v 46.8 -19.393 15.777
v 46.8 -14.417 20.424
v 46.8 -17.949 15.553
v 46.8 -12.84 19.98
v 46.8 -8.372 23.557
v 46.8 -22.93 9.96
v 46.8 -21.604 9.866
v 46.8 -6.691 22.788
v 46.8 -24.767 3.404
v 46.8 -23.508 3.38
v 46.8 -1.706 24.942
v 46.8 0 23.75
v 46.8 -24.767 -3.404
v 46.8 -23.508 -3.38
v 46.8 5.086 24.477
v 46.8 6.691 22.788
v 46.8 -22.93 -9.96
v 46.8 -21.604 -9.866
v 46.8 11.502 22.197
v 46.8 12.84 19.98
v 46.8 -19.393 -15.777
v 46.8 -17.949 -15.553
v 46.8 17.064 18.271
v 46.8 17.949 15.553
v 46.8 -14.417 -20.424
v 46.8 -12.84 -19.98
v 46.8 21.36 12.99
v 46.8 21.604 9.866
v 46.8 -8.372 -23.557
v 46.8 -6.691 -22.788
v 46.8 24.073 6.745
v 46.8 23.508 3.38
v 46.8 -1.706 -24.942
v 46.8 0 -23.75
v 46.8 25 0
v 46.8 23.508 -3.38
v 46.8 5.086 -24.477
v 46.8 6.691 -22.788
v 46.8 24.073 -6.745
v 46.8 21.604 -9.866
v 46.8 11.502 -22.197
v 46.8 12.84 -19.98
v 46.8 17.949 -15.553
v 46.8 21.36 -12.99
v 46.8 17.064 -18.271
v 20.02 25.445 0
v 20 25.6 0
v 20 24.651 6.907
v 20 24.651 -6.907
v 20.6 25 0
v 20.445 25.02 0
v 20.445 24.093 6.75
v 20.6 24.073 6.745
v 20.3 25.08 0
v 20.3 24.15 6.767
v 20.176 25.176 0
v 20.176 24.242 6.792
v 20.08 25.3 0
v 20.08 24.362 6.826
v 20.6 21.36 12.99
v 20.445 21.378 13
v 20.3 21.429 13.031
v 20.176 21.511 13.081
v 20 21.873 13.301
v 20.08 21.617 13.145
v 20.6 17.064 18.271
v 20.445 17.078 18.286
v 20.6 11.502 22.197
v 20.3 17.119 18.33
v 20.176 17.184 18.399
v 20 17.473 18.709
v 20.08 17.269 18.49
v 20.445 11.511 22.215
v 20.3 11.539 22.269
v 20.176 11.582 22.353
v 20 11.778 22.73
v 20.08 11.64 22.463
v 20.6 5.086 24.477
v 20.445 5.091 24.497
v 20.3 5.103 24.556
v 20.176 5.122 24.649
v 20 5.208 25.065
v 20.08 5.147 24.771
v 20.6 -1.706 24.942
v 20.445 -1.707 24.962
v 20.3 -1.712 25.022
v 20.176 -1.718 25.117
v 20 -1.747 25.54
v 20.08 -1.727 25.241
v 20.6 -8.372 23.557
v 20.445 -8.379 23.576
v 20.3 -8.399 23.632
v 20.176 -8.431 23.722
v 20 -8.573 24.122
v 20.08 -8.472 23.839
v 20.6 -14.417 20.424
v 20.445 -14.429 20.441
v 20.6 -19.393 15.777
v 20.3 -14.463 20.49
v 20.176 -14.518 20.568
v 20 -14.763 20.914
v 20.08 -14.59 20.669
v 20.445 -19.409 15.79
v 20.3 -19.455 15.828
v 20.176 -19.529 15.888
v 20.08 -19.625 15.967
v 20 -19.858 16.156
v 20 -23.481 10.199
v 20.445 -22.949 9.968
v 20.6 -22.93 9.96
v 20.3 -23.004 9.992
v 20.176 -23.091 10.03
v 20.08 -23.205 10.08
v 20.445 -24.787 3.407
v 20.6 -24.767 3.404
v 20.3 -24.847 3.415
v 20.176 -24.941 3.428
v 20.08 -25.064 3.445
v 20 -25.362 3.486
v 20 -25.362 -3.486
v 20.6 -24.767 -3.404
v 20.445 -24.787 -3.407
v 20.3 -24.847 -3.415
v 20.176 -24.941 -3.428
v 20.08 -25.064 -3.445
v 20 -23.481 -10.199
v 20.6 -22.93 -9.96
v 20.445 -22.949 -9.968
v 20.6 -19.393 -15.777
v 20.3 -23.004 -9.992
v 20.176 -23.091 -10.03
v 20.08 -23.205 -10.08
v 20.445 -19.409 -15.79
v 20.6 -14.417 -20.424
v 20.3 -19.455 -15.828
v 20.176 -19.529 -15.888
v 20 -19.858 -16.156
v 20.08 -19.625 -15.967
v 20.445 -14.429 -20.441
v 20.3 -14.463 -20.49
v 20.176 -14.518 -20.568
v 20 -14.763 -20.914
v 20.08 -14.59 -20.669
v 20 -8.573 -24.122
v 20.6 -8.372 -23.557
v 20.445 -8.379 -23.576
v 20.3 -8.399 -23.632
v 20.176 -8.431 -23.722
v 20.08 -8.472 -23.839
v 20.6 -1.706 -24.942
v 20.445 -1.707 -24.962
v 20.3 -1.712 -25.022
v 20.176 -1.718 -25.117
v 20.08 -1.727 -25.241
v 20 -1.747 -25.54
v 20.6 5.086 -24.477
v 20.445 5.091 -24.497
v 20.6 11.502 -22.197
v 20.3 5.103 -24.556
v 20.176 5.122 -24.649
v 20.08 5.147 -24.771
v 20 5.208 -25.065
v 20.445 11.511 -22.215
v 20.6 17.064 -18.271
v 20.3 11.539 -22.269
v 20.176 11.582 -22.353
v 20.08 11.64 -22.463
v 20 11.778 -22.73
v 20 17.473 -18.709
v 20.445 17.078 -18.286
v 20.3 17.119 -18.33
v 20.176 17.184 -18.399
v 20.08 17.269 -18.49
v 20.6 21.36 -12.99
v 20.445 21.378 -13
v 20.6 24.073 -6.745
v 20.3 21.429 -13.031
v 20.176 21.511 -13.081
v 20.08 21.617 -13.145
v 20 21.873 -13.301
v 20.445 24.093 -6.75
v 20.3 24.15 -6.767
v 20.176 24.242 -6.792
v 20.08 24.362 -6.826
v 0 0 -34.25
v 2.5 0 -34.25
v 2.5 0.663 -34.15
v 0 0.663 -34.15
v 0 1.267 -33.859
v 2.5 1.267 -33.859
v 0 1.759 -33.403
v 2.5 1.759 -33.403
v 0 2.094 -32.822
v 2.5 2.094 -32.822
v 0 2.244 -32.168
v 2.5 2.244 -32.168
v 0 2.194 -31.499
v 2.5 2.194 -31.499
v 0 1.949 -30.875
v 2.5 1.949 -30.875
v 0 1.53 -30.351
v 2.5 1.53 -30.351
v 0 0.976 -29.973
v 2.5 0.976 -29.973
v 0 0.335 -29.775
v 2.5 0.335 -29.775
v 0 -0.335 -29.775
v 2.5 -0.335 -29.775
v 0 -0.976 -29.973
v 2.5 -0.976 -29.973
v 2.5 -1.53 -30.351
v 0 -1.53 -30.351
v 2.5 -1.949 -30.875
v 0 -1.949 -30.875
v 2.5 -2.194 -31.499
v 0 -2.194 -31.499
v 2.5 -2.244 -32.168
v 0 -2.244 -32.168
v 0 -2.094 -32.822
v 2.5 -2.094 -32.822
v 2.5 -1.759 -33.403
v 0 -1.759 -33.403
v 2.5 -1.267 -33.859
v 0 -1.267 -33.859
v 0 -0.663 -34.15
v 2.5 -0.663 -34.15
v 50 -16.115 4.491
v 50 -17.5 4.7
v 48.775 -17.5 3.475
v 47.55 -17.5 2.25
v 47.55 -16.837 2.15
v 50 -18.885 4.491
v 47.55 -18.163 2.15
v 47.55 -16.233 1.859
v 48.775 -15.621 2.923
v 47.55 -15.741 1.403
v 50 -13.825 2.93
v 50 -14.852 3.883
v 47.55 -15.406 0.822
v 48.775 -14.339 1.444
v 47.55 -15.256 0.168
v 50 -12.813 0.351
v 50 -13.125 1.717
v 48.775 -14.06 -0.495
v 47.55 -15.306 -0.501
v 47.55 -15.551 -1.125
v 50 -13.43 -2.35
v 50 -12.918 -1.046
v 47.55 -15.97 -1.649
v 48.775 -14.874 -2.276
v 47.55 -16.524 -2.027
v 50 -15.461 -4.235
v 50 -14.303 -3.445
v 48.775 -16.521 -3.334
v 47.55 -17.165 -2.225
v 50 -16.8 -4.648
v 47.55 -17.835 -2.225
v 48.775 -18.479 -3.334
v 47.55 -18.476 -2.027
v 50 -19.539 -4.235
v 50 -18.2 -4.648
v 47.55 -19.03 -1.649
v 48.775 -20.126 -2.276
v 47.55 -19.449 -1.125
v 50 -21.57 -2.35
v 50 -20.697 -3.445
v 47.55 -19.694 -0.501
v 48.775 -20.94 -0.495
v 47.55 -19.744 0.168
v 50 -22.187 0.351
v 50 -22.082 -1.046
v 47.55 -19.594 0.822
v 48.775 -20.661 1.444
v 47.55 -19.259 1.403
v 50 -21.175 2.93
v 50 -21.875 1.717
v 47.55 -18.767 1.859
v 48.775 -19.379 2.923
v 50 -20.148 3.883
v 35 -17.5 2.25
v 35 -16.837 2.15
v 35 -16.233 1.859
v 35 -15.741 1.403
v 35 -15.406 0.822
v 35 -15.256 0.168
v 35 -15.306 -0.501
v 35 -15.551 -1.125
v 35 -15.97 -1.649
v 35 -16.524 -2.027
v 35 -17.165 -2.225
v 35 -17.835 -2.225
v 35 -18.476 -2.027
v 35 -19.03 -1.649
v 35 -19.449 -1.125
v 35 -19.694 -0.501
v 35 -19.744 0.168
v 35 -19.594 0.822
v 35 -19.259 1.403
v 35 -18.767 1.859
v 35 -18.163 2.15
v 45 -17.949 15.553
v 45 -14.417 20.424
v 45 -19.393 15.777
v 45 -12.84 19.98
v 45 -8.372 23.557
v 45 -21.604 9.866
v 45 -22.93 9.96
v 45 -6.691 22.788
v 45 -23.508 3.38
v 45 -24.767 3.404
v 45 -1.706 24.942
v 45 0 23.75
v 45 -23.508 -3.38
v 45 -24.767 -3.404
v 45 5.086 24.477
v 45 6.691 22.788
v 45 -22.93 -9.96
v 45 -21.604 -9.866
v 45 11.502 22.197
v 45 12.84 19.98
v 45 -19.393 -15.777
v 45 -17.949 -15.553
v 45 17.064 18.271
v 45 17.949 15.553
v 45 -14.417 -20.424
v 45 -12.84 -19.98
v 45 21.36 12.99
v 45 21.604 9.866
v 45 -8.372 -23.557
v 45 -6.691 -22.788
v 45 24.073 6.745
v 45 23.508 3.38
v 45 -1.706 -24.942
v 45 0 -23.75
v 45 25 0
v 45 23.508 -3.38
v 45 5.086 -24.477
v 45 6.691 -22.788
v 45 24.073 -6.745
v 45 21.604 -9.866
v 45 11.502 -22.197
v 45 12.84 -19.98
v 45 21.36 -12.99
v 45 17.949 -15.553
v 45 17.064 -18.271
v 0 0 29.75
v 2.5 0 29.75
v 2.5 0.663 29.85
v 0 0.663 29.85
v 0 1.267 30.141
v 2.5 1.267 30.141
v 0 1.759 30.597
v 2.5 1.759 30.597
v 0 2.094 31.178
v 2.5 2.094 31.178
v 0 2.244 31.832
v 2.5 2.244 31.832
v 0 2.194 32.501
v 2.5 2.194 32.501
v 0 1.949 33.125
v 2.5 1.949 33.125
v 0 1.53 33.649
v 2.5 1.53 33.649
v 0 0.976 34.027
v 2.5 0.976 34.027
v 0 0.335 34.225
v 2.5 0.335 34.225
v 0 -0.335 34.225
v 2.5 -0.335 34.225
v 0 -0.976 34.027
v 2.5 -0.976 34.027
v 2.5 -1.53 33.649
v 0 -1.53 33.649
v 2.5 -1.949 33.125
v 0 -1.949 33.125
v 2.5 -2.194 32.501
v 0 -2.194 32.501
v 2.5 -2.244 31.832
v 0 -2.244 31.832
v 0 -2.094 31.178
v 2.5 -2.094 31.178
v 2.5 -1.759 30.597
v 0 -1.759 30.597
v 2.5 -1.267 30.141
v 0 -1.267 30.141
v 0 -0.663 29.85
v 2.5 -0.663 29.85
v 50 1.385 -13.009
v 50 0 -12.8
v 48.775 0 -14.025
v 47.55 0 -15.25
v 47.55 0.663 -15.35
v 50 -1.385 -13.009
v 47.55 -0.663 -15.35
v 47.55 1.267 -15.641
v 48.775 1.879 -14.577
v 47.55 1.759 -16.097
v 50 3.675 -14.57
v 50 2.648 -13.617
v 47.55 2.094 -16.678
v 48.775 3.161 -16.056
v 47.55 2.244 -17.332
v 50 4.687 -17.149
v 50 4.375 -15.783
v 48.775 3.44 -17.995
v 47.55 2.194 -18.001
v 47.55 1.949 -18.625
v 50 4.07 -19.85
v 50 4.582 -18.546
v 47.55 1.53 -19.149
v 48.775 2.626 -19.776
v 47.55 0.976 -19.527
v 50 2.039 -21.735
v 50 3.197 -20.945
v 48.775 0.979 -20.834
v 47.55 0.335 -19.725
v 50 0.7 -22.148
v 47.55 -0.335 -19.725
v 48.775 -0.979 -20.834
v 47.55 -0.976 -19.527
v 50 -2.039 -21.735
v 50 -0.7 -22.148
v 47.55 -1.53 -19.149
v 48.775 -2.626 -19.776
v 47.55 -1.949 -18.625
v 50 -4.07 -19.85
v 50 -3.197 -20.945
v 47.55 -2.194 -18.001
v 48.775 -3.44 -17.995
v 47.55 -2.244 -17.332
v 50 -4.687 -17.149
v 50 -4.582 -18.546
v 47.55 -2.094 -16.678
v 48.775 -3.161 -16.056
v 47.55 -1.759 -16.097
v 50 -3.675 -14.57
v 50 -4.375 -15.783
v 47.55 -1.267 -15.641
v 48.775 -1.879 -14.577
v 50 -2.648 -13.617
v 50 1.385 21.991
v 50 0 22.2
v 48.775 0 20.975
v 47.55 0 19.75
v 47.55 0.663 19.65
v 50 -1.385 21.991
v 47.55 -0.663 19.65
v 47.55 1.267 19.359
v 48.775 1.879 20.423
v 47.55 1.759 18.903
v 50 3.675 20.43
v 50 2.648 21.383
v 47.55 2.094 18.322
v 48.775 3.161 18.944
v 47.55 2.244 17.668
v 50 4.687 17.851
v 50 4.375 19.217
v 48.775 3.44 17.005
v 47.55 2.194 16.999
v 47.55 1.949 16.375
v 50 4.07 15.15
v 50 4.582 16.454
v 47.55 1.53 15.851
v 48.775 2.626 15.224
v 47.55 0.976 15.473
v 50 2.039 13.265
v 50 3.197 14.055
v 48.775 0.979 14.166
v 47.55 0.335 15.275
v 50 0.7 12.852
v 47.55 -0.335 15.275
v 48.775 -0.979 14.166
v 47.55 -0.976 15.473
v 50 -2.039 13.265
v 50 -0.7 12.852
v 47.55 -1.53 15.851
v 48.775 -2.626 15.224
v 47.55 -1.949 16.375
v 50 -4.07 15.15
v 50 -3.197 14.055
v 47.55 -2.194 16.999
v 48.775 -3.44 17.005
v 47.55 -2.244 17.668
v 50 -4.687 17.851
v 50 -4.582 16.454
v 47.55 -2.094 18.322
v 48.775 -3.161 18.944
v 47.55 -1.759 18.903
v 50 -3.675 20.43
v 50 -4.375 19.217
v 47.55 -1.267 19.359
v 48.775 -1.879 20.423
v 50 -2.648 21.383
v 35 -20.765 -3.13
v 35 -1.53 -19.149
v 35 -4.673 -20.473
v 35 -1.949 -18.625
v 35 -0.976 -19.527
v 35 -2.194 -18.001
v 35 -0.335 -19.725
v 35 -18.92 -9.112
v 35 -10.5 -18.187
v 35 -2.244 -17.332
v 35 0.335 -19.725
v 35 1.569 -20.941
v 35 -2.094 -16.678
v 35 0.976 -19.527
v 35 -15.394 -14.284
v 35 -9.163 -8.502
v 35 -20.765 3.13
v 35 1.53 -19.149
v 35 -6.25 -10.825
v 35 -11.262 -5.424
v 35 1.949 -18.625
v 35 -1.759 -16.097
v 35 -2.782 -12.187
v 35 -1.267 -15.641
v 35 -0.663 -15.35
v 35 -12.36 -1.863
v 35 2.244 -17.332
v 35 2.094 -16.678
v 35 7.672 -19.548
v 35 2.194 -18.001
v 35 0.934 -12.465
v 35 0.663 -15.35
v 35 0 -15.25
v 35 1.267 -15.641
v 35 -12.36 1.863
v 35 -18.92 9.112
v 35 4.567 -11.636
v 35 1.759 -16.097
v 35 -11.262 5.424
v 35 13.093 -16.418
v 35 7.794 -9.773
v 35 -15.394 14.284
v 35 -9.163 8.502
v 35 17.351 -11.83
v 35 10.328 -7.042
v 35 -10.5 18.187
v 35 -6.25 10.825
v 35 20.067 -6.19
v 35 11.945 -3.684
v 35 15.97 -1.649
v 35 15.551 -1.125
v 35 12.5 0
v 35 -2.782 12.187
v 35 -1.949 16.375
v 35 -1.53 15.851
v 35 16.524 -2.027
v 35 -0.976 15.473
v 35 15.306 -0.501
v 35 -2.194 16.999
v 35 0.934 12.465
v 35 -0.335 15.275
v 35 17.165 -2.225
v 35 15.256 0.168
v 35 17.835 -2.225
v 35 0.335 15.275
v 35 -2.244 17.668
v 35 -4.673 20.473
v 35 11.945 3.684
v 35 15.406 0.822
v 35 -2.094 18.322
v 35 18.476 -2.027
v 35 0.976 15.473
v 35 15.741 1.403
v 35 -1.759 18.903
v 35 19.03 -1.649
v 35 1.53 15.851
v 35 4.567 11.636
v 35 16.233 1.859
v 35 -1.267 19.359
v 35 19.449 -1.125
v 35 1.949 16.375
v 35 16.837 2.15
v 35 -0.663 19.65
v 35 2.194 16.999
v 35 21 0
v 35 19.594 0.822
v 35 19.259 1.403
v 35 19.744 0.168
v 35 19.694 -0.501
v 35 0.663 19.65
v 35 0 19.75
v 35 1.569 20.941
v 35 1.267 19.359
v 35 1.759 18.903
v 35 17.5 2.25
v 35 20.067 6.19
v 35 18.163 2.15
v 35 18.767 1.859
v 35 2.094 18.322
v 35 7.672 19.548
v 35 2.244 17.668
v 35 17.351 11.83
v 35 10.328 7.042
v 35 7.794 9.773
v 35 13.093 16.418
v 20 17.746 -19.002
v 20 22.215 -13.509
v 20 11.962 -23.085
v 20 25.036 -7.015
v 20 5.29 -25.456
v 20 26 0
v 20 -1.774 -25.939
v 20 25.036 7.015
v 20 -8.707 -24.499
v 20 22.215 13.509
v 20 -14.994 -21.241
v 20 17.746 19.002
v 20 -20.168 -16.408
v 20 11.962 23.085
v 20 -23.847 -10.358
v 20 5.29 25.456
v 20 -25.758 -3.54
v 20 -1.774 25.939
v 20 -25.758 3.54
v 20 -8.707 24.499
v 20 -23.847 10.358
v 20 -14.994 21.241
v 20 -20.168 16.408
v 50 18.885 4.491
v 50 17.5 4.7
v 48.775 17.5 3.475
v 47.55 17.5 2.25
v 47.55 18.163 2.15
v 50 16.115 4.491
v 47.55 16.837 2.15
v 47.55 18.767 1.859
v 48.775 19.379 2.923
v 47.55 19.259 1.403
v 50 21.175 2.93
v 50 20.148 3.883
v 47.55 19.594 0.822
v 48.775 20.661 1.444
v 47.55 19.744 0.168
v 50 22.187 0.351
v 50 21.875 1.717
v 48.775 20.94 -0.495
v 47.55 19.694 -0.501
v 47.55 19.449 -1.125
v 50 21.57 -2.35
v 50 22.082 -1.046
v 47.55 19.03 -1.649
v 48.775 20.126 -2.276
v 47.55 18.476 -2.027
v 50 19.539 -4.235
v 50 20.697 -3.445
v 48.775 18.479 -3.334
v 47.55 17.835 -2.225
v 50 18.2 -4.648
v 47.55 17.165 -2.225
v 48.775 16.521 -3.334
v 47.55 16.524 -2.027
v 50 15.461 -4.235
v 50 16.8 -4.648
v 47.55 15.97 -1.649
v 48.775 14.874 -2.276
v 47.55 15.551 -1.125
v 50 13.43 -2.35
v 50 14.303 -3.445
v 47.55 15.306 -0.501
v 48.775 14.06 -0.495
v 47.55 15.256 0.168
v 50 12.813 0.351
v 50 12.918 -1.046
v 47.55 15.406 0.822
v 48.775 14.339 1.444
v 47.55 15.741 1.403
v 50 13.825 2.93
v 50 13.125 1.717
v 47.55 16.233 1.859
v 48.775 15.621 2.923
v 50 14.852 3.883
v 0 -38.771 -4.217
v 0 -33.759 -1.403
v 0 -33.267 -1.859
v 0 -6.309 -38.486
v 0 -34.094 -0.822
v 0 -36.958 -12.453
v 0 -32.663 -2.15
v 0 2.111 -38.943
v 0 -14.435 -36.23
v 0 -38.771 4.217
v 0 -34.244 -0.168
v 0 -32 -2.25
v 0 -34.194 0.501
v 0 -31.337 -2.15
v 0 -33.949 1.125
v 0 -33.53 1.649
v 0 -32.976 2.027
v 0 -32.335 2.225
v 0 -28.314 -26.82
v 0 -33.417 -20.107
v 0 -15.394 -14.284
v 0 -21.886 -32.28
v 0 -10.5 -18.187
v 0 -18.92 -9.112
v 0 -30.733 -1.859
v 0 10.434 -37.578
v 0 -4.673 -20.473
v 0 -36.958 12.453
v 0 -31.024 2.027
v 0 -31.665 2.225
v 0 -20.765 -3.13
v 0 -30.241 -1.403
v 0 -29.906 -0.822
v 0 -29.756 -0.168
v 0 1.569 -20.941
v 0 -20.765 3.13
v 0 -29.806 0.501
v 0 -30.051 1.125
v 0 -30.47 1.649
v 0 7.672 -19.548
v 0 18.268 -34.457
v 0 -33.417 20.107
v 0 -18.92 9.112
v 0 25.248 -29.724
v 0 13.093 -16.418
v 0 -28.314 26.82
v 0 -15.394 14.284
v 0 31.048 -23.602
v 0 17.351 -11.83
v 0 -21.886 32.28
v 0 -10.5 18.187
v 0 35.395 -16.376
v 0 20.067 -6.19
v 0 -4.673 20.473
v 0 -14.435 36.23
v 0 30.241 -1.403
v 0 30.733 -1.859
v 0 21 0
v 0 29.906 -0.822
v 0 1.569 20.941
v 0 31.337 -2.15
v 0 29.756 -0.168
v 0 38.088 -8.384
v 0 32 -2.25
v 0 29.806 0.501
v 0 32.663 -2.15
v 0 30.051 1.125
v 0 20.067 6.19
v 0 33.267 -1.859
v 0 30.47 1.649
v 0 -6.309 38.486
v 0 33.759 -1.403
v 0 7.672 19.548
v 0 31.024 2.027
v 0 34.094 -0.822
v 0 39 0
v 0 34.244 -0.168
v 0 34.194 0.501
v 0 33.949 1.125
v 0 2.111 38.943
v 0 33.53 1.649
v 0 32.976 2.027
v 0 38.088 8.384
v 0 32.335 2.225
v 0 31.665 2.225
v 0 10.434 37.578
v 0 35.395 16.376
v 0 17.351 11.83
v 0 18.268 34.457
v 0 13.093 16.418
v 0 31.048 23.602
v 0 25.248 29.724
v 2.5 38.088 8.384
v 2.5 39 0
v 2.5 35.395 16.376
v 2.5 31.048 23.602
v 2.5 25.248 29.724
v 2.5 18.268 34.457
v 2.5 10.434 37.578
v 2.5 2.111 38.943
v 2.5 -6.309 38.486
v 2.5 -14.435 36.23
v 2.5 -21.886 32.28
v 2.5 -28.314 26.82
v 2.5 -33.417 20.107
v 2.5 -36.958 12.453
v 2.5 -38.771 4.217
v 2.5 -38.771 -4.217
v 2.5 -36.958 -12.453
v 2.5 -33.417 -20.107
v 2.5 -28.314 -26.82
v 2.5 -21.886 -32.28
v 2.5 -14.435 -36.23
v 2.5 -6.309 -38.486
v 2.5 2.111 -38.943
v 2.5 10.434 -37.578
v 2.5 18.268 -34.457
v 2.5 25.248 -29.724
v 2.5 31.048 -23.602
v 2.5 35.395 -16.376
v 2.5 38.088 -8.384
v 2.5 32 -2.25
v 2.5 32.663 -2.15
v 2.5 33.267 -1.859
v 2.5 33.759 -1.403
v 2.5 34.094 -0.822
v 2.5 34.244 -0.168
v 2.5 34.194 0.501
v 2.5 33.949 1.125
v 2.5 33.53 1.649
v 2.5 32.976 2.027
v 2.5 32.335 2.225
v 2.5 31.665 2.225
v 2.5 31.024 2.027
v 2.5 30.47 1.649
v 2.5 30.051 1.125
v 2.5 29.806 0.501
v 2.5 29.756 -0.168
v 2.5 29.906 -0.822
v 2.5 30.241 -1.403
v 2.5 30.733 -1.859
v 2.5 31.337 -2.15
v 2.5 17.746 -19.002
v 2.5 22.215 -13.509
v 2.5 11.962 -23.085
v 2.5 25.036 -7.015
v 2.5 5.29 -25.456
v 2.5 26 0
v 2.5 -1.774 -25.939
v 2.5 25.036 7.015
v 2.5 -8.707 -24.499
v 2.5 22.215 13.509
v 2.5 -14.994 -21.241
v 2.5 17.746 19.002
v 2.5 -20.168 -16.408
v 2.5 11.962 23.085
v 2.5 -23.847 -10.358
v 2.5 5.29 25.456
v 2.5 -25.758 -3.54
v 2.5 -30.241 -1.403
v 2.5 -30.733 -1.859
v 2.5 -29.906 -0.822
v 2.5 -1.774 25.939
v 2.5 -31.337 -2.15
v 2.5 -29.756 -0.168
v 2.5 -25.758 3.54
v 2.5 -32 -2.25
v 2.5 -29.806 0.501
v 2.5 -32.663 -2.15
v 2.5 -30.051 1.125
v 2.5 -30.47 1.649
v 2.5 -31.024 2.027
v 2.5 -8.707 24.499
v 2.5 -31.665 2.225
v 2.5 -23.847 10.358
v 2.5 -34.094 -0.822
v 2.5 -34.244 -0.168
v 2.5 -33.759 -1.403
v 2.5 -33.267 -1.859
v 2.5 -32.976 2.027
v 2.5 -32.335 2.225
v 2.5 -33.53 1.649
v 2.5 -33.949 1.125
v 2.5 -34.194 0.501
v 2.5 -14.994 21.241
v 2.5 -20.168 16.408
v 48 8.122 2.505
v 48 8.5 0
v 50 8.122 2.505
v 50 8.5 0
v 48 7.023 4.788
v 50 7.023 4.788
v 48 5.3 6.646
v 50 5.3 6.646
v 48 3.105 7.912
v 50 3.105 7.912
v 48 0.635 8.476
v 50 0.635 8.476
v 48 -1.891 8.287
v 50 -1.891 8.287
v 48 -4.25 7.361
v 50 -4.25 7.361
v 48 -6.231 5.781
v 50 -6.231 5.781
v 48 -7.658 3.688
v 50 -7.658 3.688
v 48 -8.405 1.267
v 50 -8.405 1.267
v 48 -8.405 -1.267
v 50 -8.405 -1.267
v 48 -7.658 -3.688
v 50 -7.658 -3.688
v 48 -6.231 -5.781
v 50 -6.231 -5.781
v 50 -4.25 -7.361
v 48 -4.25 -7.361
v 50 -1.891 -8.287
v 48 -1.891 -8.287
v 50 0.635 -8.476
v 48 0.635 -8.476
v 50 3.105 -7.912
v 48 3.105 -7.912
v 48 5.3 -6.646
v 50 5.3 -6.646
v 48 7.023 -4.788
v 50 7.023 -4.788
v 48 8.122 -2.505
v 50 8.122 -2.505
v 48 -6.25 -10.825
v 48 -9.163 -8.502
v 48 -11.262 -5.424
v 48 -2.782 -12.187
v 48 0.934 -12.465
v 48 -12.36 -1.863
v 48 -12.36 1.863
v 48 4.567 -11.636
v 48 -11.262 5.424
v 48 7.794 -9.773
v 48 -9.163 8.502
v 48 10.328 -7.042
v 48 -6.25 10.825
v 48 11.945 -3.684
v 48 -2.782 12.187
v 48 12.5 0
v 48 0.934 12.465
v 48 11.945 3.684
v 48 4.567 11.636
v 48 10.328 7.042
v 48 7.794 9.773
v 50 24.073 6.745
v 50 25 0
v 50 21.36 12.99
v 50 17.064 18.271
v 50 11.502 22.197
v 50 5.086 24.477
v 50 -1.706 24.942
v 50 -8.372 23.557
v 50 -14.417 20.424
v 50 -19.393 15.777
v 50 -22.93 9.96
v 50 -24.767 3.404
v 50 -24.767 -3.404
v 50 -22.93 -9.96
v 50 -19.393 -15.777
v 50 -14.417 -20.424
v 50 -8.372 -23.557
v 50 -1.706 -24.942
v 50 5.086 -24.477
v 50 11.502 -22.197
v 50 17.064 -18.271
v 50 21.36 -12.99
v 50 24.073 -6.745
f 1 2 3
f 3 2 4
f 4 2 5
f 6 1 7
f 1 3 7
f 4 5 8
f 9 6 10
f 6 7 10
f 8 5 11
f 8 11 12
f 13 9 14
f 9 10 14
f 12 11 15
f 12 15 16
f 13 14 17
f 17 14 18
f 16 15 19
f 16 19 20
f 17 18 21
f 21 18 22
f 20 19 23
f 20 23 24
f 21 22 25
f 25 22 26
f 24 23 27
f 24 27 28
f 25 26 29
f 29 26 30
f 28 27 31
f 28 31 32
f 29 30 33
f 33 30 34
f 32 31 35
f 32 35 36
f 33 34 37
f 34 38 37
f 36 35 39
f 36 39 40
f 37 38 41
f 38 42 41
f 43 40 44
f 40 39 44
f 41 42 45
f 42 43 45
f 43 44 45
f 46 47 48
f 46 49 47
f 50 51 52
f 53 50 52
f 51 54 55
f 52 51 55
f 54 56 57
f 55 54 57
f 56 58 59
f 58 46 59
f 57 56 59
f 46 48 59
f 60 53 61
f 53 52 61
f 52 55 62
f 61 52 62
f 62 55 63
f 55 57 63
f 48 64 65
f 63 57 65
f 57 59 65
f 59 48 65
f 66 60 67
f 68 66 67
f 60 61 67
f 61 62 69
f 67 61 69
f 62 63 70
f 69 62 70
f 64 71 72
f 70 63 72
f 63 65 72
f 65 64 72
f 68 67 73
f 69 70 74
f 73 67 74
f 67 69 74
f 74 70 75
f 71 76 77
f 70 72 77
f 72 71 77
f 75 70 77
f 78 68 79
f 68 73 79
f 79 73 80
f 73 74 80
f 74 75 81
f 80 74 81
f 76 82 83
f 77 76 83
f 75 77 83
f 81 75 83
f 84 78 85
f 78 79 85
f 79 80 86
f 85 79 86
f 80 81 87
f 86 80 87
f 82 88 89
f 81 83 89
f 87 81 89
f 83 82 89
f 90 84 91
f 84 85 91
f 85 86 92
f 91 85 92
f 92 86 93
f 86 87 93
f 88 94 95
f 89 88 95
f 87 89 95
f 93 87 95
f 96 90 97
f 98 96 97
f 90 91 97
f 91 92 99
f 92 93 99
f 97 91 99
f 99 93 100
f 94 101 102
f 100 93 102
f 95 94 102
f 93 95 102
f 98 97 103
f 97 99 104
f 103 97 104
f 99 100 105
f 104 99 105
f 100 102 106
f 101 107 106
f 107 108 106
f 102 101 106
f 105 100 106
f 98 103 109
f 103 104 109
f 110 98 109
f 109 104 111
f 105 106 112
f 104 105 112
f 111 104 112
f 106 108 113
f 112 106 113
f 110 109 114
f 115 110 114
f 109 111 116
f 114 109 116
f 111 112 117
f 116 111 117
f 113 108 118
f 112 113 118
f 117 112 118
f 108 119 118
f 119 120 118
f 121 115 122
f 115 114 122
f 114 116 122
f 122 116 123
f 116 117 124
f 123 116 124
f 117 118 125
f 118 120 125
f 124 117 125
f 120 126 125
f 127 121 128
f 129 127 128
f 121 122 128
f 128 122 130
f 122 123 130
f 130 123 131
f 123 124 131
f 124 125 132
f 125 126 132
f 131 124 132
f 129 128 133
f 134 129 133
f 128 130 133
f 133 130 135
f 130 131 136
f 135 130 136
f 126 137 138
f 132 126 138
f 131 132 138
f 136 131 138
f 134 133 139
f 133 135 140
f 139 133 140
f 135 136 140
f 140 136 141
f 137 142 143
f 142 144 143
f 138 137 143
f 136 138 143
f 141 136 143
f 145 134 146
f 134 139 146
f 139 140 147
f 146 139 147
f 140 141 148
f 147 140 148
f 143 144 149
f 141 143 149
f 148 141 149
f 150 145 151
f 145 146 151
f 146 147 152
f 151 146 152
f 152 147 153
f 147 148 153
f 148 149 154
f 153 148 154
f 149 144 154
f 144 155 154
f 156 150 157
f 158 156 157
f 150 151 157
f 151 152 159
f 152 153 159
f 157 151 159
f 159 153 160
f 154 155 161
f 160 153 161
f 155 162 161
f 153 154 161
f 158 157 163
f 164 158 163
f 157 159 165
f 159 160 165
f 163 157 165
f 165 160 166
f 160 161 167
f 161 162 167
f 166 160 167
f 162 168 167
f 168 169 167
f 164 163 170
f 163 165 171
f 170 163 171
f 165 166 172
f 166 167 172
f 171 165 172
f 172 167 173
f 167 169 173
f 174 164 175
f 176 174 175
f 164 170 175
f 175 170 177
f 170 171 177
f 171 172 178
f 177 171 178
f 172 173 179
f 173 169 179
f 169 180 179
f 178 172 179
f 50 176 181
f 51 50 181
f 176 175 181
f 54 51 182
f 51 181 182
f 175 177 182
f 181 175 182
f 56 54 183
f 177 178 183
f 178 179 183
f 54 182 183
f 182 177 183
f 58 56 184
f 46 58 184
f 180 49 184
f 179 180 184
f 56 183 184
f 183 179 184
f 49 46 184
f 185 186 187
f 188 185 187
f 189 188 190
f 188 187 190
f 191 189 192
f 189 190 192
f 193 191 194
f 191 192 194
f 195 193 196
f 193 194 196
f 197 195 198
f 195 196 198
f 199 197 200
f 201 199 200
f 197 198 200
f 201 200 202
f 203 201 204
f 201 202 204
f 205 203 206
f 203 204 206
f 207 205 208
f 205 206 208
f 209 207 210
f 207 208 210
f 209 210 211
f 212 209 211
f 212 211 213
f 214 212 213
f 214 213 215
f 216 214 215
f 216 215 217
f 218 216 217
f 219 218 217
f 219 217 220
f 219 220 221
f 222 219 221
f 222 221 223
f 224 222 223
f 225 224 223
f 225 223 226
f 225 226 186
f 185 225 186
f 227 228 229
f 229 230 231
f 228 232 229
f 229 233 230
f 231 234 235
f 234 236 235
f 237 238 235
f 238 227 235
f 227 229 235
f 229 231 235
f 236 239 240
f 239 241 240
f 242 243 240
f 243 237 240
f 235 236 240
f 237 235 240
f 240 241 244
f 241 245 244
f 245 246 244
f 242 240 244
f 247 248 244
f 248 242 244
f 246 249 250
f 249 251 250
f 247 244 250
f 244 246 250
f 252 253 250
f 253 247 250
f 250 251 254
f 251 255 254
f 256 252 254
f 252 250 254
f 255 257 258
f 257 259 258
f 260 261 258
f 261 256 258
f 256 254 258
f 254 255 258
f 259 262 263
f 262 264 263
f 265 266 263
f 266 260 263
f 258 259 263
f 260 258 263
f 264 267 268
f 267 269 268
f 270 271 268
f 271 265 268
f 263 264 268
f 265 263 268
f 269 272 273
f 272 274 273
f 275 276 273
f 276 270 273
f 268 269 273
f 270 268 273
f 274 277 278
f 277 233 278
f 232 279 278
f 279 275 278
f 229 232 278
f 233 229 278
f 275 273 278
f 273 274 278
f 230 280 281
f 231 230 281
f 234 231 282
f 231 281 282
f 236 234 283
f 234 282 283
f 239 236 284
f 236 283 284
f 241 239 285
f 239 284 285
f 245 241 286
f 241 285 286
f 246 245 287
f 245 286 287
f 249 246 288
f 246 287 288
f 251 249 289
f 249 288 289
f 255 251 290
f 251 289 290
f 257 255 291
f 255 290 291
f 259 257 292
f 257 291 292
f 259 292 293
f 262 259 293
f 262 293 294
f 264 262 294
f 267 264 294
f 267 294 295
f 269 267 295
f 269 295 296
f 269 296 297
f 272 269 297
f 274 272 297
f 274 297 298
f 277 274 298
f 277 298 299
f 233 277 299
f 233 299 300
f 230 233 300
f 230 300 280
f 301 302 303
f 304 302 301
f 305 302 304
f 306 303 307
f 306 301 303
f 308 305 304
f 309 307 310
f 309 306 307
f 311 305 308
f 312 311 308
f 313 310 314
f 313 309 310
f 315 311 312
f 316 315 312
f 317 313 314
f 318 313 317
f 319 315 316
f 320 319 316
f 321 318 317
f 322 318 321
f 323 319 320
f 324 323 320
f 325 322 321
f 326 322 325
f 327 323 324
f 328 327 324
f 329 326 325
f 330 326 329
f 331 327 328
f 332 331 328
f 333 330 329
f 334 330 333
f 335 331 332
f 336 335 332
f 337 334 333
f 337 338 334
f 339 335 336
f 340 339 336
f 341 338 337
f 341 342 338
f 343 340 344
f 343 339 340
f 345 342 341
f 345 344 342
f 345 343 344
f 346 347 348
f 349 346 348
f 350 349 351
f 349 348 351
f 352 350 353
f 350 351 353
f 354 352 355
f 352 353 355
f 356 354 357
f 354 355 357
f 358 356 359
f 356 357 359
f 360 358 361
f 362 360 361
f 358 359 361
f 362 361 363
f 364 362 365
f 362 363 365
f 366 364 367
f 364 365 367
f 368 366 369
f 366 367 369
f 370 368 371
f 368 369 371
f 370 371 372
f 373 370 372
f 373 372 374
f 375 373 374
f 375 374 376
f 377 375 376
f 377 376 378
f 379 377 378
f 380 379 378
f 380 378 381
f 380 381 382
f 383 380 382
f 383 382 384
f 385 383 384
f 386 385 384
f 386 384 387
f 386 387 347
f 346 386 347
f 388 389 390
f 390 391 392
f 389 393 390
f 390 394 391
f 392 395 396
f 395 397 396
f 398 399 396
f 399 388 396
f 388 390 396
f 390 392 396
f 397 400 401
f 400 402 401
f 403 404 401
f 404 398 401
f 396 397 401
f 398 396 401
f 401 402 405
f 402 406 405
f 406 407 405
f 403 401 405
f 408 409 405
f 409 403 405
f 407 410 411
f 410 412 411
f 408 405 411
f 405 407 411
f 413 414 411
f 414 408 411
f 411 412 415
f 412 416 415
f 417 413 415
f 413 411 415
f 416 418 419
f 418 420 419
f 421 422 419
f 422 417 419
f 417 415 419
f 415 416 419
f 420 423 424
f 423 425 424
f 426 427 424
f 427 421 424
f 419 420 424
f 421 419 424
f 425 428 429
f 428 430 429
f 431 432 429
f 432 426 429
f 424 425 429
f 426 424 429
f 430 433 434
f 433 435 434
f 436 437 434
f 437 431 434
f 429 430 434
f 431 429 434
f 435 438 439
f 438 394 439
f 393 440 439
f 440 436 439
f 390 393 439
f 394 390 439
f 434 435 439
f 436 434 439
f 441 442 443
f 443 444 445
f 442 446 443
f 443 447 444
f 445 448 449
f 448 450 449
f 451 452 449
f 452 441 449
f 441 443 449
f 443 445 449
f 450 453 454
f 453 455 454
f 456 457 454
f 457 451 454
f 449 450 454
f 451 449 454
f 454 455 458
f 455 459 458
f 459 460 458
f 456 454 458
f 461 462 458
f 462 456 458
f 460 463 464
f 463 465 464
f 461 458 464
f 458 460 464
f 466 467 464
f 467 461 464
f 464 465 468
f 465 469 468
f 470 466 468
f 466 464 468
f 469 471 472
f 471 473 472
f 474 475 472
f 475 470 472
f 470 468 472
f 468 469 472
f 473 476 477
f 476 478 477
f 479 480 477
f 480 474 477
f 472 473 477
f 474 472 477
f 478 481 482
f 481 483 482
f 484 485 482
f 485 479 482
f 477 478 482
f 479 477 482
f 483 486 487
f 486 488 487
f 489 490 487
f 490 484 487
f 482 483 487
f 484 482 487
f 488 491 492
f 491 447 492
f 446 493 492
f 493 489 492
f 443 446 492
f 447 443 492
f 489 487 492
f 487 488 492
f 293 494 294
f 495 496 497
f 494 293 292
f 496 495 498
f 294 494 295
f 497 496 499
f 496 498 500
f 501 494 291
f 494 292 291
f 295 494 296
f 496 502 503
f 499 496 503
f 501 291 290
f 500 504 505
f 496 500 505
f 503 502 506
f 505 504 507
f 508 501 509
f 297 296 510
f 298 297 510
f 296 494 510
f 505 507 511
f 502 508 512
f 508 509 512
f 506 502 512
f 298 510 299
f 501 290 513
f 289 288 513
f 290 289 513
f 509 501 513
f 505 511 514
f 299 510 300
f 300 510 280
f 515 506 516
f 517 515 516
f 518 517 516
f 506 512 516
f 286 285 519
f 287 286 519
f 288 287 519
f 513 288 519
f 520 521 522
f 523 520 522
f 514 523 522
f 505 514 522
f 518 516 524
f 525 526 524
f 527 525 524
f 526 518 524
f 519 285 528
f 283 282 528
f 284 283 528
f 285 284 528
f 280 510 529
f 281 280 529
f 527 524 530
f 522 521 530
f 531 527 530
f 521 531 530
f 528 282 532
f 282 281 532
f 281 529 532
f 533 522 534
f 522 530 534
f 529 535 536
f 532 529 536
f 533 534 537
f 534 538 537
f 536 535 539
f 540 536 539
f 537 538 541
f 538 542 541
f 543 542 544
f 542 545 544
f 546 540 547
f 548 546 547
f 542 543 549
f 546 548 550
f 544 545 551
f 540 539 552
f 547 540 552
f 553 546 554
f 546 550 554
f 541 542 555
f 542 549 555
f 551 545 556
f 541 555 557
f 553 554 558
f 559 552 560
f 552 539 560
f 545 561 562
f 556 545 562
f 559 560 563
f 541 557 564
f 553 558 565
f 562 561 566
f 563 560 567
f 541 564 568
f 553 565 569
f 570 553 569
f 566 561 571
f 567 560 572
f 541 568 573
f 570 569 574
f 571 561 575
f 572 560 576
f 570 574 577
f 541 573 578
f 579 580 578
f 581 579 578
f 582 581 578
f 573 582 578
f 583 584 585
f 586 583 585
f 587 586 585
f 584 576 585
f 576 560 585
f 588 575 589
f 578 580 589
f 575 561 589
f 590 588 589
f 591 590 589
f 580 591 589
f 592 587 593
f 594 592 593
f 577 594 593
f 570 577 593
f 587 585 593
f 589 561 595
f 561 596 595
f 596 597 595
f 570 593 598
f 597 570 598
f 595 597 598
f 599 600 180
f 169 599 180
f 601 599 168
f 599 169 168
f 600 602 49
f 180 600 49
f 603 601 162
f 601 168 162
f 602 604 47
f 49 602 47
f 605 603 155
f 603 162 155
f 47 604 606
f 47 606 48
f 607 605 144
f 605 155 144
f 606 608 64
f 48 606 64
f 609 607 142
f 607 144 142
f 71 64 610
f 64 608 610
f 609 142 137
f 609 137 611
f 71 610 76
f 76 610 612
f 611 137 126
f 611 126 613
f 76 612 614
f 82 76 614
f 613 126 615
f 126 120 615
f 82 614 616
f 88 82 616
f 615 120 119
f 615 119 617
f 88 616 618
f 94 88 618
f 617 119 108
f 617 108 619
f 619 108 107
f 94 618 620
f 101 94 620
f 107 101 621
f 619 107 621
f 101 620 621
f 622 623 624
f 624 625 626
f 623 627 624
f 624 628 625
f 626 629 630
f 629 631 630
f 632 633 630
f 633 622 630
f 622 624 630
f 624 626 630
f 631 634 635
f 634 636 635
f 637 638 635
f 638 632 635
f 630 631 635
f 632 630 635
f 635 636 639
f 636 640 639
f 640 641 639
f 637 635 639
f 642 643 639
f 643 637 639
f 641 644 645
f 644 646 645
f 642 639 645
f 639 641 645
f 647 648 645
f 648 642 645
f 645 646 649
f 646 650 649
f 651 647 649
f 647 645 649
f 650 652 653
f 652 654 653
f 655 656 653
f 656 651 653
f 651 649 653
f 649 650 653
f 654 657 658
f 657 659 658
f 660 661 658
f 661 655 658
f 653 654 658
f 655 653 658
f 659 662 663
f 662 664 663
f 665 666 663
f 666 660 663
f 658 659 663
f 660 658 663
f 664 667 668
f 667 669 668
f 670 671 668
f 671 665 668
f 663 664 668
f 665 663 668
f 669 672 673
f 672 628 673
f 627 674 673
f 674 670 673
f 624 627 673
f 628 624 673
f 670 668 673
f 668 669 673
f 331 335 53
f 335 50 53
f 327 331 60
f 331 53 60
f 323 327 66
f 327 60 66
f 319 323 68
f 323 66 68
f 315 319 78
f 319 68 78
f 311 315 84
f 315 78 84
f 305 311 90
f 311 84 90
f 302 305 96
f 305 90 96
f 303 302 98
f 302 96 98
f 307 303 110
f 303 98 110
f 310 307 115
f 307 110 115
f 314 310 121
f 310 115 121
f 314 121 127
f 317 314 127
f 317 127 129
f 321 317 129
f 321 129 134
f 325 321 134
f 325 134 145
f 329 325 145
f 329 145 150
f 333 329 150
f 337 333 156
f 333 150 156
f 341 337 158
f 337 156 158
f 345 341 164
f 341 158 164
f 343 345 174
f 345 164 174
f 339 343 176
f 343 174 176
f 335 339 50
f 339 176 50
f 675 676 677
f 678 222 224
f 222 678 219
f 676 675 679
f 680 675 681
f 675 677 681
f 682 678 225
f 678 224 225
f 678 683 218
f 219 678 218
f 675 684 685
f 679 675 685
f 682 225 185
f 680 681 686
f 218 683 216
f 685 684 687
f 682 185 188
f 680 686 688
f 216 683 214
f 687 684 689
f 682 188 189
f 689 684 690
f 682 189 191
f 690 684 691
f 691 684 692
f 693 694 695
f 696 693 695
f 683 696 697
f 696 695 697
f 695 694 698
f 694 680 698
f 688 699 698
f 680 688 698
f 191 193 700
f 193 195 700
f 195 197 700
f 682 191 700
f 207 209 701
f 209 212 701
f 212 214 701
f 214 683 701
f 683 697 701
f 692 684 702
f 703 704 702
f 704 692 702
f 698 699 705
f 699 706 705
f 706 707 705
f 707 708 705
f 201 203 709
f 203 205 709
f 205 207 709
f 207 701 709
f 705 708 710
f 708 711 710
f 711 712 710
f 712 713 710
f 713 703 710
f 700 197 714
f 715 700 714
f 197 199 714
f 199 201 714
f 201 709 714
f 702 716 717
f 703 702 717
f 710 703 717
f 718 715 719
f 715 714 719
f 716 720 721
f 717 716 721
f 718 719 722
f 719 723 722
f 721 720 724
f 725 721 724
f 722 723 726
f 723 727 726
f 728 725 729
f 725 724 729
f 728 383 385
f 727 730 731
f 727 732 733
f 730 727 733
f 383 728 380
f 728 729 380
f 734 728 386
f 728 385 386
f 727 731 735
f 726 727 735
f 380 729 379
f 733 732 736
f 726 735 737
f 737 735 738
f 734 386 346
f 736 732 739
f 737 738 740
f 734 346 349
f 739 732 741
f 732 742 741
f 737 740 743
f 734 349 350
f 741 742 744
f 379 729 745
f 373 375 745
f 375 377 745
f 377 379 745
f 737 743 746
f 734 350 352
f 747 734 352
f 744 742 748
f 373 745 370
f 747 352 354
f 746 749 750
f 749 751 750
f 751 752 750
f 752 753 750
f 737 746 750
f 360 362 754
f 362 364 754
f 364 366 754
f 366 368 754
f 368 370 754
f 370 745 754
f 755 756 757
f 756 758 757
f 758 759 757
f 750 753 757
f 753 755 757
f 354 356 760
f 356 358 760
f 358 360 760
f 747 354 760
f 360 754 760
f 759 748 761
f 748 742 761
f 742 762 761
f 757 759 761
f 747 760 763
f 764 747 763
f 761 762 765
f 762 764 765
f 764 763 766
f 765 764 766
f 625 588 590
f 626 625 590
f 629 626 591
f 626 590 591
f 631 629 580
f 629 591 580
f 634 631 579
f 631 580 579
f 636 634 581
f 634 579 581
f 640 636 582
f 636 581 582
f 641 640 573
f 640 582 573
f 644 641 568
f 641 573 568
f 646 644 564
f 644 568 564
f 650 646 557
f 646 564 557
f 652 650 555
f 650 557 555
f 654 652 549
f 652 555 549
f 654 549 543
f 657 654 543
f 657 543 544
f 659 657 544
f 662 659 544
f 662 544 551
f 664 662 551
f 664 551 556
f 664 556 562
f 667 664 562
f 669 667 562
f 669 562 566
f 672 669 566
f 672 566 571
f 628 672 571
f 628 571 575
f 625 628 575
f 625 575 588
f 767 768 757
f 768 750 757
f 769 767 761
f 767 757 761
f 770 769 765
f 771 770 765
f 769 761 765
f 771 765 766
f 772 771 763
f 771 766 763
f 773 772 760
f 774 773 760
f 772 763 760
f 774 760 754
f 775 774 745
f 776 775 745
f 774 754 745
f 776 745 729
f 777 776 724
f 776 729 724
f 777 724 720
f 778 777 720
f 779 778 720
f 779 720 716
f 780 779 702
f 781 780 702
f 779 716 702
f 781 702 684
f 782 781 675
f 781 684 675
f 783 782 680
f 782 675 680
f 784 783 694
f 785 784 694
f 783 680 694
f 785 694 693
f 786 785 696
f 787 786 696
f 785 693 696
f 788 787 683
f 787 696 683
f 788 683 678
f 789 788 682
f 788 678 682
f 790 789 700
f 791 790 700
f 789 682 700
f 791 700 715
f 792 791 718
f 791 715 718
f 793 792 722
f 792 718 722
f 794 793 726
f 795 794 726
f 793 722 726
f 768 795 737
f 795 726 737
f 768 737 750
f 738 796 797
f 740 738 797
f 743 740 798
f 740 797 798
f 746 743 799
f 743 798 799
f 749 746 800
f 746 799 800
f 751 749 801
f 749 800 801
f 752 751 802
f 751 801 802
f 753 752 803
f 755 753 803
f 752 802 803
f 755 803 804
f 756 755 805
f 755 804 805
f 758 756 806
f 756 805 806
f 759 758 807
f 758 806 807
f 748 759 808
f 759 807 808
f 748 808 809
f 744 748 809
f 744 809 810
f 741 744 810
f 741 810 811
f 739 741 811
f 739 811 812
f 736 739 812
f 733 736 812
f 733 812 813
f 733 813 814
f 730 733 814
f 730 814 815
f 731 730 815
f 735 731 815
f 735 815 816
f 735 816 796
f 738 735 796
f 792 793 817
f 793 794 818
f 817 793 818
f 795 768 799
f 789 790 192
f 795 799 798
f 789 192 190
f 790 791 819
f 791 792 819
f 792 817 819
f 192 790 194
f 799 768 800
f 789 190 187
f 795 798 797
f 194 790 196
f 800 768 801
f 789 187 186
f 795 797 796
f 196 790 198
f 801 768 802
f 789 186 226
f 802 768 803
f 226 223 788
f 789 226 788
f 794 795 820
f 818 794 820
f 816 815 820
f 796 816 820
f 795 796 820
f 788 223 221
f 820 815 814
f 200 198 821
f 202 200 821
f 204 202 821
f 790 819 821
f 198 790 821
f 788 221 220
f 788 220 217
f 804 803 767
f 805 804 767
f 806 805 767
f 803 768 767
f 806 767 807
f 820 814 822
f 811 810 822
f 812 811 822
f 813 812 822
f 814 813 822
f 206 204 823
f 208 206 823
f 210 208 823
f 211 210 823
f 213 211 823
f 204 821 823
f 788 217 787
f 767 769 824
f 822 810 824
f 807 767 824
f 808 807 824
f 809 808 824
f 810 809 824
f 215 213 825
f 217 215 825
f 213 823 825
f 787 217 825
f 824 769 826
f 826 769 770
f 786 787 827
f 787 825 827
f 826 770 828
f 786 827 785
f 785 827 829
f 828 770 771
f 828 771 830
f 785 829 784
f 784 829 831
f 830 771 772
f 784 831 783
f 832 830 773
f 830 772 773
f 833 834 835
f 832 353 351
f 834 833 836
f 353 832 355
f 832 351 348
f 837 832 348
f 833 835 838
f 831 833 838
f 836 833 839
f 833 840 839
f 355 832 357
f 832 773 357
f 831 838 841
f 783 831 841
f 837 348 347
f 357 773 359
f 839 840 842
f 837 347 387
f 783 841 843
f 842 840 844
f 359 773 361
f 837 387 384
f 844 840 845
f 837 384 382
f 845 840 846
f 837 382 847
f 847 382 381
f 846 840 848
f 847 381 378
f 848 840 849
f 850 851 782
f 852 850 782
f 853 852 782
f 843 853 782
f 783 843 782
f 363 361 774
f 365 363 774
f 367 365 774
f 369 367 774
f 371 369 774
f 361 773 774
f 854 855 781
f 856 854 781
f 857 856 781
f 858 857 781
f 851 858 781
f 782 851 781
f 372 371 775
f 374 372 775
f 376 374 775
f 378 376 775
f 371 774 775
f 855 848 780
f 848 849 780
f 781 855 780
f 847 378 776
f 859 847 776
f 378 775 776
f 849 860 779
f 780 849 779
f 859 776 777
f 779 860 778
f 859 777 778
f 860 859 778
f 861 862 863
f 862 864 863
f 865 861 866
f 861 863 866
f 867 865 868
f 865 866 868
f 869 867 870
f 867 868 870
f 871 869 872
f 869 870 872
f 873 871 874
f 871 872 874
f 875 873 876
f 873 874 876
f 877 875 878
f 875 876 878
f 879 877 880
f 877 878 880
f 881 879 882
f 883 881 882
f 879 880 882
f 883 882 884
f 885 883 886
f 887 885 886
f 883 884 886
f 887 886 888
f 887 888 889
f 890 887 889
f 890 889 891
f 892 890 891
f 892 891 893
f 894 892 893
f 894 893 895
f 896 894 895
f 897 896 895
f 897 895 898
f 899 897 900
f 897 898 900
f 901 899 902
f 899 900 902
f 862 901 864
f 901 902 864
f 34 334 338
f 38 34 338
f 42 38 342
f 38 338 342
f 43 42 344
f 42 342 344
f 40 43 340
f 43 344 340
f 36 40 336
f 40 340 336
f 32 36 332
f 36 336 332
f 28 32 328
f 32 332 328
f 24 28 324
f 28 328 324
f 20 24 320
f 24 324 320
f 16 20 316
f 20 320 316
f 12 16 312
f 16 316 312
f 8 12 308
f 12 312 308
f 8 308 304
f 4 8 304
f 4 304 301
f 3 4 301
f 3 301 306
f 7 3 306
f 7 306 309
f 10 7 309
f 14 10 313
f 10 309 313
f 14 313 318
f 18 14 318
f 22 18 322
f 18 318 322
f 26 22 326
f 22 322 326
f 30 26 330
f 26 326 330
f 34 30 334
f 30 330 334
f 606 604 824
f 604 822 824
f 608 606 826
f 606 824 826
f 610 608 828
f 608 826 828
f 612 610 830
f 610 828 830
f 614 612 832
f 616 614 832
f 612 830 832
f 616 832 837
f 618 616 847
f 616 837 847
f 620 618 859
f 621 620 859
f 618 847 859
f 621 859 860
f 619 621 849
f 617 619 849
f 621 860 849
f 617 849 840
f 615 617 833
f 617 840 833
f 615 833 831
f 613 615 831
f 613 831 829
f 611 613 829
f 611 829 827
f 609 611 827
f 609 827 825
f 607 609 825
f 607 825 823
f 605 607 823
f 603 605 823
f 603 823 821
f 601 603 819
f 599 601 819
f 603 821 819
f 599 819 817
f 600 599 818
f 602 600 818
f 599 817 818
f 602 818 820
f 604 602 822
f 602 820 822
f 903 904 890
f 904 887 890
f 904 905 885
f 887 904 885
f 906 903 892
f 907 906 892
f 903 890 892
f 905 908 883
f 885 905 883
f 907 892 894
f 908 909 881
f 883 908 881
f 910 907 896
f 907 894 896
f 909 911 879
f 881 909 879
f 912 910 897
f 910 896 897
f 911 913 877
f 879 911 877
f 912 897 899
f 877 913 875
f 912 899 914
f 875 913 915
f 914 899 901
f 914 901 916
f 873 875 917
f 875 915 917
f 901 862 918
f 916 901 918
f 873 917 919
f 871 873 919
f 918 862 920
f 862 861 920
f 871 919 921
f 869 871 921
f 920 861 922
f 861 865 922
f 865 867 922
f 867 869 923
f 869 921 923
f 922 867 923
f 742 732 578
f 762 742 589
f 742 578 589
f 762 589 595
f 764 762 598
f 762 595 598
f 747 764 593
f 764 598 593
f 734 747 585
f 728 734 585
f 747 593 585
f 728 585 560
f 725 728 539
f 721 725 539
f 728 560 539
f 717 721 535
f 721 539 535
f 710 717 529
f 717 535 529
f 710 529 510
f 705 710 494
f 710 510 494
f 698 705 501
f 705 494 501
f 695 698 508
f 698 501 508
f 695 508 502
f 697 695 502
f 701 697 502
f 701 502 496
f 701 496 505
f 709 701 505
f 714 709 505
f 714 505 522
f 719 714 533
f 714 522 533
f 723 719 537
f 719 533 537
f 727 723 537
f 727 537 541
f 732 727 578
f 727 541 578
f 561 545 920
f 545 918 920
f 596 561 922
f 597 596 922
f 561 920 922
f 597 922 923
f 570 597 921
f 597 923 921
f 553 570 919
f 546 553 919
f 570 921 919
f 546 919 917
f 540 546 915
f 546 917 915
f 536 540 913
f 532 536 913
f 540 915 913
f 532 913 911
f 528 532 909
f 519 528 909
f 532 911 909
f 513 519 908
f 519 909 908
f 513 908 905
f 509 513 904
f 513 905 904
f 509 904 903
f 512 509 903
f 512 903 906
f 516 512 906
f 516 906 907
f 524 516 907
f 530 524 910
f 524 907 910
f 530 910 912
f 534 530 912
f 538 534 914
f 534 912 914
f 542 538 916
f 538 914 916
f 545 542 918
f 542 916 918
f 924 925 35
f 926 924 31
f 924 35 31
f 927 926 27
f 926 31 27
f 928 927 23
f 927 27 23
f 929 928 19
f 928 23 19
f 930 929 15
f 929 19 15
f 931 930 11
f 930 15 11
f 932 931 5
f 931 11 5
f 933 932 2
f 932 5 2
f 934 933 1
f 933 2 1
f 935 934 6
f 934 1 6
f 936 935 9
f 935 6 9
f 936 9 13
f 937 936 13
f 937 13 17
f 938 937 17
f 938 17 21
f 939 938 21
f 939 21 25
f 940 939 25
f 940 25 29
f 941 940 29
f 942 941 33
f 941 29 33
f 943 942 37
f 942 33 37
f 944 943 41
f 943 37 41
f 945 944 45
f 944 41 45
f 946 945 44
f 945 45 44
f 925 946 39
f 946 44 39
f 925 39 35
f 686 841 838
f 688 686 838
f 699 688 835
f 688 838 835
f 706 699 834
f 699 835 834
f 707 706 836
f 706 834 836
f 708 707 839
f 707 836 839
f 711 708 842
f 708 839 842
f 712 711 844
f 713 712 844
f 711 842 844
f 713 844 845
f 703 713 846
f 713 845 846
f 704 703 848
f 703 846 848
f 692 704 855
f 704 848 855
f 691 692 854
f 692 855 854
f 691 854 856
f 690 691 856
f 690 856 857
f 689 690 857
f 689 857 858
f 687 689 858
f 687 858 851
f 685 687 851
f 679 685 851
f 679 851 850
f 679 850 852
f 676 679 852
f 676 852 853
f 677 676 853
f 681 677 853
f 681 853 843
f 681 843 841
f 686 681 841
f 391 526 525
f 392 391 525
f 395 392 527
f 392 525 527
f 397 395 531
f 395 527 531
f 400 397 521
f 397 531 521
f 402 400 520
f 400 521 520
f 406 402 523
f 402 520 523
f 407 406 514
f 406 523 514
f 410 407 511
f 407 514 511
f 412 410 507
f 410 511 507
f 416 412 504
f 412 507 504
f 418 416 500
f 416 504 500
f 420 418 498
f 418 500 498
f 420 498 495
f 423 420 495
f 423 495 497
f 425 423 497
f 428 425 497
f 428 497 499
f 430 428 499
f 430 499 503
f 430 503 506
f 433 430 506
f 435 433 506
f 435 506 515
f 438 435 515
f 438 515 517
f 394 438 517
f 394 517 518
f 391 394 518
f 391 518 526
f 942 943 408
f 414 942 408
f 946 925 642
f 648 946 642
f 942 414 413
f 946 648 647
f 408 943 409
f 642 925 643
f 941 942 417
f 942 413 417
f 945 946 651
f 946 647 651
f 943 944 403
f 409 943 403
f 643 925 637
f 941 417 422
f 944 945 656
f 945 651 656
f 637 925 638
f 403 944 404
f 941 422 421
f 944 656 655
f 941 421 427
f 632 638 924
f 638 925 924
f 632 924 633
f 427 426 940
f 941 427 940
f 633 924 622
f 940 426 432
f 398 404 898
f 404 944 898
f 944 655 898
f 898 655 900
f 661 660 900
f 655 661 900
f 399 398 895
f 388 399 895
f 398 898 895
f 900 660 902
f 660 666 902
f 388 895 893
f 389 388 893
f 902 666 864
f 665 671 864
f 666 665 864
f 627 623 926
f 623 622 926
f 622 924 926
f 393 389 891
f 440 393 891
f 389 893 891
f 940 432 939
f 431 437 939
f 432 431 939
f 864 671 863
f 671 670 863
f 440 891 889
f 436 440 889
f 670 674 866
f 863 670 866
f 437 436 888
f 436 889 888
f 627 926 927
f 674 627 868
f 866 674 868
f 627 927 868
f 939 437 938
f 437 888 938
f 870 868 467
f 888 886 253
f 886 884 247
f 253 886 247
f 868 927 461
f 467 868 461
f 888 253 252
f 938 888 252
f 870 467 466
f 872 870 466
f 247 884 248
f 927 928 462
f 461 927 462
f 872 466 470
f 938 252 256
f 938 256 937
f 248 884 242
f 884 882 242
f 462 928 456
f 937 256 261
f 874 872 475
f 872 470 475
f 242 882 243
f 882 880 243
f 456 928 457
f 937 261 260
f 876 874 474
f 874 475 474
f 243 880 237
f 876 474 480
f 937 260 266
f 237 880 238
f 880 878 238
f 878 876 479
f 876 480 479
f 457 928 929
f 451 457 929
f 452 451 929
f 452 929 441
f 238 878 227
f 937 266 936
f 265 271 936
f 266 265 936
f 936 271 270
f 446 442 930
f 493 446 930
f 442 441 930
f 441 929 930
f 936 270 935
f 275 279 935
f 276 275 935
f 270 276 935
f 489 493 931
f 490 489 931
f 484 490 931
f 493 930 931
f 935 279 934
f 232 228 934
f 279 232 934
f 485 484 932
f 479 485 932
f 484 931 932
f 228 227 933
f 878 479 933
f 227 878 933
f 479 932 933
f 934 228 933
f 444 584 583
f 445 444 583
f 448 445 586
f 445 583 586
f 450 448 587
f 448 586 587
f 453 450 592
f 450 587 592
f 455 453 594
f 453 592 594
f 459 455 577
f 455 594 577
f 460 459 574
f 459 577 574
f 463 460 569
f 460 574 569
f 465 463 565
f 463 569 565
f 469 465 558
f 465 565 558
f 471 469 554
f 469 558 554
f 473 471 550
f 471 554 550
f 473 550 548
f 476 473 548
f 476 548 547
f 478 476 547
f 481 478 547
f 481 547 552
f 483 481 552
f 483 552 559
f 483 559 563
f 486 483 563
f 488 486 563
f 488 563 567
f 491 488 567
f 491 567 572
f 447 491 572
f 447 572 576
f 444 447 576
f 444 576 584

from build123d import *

# Parameters (mm, degrees)
CSK_FOR_M4_FLAT_HEAD_MACHINE_SCREW1_D           = 4.5
CSK_FOR_M4_FLAT_HEAD_MACHINE_SCREW1_DEPTH       = 15
CSK_FOR_M4_FLAT_HEAD_MACHINE_SCREW1_CSINK_D     = 9.4
CSK_FOR_M4_FLAT_HEAD_MACHINE_SCREW1_CSINK_ANGLE = 90
FILLET1_R                                       = 0.6
SKETCH9_R                                       = 25
SKETCH9_R_2                                     = 23.75
CUT_EXTRUDE1_DEPTH                              = 1.8
M4_CLEARANCE_HOLE1_D                            = 4.5
M4_CLEARANCE_HOLE1_DEPTH                        = 2.5


with BuildPart() as part:
    # Sketch2 → Revolve1 (revolve)
    with BuildSketch(Plane.XY):
        Polygon((0, 21), (35, 21), (35, 12.5), (48, 12.5), (48, 8.5), (50, 8.5), (50, 25), (20, 25), (20, 26), (2.5, 26), (2.5, 39), (0, 39), (0, 26), align=None)
    revolve(axis=Axis((-64.103352454, 0, 0), (1, 0, 0)))

    # CSK for M4 Flat Head Machine Screw1
    with Locations(Plane(origin=(50, 0, 0), x_dir=(0, 0, -1), z_dir=(1, 0, 0))):
        with Locations((0, 17.5), (17.5, 0), (0, -17.5), (-17.5, 0)):
            CounterSinkHole(CSK_FOR_M4_FLAT_HEAD_MACHINE_SCREW1_D / 2, CSK_FOR_M4_FLAT_HEAD_MACHINE_SCREW1_CSINK_D / 2, depth=CSK_FOR_M4_FLAT_HEAD_MACHINE_SCREW1_DEPTH, counter_sink_angle=CSK_FOR_M4_FLAT_HEAD_MACHINE_SCREW1_CSINK_ANGLE)

    # Fillet1
    fillet1_edges = [part.edges().sort_by_distance(p)[0] for p in [
        (20, -25, 0),
    ]]
    fillet(fillet1_edges, radius=FILLET1_R)

    # Sketch9 → Cut-Extrude1 (cut)
    with BuildSketch(Plane(origin=(45, 0, 0), x_dir=(0, 0, -1), z_dir=(1, 0, 0))):
        Circle(SKETCH9_R)
        Circle(SKETCH9_R_2, mode=Mode.SUBTRACT)
    extrude(amount=CUT_EXTRUDE1_DEPTH, mode=Mode.SUBTRACT)

    # M4 Clearance Hole1
    with Locations(Plane.ZY):
        with Locations((0, 32), (0, -32), (32, 0), (-32, 0)):
            Hole(M4_CLEARANCE_HOLE1_D / 2, depth=M4_CLEARANCE_HOLE1_DEPTH)


solid = part.part
